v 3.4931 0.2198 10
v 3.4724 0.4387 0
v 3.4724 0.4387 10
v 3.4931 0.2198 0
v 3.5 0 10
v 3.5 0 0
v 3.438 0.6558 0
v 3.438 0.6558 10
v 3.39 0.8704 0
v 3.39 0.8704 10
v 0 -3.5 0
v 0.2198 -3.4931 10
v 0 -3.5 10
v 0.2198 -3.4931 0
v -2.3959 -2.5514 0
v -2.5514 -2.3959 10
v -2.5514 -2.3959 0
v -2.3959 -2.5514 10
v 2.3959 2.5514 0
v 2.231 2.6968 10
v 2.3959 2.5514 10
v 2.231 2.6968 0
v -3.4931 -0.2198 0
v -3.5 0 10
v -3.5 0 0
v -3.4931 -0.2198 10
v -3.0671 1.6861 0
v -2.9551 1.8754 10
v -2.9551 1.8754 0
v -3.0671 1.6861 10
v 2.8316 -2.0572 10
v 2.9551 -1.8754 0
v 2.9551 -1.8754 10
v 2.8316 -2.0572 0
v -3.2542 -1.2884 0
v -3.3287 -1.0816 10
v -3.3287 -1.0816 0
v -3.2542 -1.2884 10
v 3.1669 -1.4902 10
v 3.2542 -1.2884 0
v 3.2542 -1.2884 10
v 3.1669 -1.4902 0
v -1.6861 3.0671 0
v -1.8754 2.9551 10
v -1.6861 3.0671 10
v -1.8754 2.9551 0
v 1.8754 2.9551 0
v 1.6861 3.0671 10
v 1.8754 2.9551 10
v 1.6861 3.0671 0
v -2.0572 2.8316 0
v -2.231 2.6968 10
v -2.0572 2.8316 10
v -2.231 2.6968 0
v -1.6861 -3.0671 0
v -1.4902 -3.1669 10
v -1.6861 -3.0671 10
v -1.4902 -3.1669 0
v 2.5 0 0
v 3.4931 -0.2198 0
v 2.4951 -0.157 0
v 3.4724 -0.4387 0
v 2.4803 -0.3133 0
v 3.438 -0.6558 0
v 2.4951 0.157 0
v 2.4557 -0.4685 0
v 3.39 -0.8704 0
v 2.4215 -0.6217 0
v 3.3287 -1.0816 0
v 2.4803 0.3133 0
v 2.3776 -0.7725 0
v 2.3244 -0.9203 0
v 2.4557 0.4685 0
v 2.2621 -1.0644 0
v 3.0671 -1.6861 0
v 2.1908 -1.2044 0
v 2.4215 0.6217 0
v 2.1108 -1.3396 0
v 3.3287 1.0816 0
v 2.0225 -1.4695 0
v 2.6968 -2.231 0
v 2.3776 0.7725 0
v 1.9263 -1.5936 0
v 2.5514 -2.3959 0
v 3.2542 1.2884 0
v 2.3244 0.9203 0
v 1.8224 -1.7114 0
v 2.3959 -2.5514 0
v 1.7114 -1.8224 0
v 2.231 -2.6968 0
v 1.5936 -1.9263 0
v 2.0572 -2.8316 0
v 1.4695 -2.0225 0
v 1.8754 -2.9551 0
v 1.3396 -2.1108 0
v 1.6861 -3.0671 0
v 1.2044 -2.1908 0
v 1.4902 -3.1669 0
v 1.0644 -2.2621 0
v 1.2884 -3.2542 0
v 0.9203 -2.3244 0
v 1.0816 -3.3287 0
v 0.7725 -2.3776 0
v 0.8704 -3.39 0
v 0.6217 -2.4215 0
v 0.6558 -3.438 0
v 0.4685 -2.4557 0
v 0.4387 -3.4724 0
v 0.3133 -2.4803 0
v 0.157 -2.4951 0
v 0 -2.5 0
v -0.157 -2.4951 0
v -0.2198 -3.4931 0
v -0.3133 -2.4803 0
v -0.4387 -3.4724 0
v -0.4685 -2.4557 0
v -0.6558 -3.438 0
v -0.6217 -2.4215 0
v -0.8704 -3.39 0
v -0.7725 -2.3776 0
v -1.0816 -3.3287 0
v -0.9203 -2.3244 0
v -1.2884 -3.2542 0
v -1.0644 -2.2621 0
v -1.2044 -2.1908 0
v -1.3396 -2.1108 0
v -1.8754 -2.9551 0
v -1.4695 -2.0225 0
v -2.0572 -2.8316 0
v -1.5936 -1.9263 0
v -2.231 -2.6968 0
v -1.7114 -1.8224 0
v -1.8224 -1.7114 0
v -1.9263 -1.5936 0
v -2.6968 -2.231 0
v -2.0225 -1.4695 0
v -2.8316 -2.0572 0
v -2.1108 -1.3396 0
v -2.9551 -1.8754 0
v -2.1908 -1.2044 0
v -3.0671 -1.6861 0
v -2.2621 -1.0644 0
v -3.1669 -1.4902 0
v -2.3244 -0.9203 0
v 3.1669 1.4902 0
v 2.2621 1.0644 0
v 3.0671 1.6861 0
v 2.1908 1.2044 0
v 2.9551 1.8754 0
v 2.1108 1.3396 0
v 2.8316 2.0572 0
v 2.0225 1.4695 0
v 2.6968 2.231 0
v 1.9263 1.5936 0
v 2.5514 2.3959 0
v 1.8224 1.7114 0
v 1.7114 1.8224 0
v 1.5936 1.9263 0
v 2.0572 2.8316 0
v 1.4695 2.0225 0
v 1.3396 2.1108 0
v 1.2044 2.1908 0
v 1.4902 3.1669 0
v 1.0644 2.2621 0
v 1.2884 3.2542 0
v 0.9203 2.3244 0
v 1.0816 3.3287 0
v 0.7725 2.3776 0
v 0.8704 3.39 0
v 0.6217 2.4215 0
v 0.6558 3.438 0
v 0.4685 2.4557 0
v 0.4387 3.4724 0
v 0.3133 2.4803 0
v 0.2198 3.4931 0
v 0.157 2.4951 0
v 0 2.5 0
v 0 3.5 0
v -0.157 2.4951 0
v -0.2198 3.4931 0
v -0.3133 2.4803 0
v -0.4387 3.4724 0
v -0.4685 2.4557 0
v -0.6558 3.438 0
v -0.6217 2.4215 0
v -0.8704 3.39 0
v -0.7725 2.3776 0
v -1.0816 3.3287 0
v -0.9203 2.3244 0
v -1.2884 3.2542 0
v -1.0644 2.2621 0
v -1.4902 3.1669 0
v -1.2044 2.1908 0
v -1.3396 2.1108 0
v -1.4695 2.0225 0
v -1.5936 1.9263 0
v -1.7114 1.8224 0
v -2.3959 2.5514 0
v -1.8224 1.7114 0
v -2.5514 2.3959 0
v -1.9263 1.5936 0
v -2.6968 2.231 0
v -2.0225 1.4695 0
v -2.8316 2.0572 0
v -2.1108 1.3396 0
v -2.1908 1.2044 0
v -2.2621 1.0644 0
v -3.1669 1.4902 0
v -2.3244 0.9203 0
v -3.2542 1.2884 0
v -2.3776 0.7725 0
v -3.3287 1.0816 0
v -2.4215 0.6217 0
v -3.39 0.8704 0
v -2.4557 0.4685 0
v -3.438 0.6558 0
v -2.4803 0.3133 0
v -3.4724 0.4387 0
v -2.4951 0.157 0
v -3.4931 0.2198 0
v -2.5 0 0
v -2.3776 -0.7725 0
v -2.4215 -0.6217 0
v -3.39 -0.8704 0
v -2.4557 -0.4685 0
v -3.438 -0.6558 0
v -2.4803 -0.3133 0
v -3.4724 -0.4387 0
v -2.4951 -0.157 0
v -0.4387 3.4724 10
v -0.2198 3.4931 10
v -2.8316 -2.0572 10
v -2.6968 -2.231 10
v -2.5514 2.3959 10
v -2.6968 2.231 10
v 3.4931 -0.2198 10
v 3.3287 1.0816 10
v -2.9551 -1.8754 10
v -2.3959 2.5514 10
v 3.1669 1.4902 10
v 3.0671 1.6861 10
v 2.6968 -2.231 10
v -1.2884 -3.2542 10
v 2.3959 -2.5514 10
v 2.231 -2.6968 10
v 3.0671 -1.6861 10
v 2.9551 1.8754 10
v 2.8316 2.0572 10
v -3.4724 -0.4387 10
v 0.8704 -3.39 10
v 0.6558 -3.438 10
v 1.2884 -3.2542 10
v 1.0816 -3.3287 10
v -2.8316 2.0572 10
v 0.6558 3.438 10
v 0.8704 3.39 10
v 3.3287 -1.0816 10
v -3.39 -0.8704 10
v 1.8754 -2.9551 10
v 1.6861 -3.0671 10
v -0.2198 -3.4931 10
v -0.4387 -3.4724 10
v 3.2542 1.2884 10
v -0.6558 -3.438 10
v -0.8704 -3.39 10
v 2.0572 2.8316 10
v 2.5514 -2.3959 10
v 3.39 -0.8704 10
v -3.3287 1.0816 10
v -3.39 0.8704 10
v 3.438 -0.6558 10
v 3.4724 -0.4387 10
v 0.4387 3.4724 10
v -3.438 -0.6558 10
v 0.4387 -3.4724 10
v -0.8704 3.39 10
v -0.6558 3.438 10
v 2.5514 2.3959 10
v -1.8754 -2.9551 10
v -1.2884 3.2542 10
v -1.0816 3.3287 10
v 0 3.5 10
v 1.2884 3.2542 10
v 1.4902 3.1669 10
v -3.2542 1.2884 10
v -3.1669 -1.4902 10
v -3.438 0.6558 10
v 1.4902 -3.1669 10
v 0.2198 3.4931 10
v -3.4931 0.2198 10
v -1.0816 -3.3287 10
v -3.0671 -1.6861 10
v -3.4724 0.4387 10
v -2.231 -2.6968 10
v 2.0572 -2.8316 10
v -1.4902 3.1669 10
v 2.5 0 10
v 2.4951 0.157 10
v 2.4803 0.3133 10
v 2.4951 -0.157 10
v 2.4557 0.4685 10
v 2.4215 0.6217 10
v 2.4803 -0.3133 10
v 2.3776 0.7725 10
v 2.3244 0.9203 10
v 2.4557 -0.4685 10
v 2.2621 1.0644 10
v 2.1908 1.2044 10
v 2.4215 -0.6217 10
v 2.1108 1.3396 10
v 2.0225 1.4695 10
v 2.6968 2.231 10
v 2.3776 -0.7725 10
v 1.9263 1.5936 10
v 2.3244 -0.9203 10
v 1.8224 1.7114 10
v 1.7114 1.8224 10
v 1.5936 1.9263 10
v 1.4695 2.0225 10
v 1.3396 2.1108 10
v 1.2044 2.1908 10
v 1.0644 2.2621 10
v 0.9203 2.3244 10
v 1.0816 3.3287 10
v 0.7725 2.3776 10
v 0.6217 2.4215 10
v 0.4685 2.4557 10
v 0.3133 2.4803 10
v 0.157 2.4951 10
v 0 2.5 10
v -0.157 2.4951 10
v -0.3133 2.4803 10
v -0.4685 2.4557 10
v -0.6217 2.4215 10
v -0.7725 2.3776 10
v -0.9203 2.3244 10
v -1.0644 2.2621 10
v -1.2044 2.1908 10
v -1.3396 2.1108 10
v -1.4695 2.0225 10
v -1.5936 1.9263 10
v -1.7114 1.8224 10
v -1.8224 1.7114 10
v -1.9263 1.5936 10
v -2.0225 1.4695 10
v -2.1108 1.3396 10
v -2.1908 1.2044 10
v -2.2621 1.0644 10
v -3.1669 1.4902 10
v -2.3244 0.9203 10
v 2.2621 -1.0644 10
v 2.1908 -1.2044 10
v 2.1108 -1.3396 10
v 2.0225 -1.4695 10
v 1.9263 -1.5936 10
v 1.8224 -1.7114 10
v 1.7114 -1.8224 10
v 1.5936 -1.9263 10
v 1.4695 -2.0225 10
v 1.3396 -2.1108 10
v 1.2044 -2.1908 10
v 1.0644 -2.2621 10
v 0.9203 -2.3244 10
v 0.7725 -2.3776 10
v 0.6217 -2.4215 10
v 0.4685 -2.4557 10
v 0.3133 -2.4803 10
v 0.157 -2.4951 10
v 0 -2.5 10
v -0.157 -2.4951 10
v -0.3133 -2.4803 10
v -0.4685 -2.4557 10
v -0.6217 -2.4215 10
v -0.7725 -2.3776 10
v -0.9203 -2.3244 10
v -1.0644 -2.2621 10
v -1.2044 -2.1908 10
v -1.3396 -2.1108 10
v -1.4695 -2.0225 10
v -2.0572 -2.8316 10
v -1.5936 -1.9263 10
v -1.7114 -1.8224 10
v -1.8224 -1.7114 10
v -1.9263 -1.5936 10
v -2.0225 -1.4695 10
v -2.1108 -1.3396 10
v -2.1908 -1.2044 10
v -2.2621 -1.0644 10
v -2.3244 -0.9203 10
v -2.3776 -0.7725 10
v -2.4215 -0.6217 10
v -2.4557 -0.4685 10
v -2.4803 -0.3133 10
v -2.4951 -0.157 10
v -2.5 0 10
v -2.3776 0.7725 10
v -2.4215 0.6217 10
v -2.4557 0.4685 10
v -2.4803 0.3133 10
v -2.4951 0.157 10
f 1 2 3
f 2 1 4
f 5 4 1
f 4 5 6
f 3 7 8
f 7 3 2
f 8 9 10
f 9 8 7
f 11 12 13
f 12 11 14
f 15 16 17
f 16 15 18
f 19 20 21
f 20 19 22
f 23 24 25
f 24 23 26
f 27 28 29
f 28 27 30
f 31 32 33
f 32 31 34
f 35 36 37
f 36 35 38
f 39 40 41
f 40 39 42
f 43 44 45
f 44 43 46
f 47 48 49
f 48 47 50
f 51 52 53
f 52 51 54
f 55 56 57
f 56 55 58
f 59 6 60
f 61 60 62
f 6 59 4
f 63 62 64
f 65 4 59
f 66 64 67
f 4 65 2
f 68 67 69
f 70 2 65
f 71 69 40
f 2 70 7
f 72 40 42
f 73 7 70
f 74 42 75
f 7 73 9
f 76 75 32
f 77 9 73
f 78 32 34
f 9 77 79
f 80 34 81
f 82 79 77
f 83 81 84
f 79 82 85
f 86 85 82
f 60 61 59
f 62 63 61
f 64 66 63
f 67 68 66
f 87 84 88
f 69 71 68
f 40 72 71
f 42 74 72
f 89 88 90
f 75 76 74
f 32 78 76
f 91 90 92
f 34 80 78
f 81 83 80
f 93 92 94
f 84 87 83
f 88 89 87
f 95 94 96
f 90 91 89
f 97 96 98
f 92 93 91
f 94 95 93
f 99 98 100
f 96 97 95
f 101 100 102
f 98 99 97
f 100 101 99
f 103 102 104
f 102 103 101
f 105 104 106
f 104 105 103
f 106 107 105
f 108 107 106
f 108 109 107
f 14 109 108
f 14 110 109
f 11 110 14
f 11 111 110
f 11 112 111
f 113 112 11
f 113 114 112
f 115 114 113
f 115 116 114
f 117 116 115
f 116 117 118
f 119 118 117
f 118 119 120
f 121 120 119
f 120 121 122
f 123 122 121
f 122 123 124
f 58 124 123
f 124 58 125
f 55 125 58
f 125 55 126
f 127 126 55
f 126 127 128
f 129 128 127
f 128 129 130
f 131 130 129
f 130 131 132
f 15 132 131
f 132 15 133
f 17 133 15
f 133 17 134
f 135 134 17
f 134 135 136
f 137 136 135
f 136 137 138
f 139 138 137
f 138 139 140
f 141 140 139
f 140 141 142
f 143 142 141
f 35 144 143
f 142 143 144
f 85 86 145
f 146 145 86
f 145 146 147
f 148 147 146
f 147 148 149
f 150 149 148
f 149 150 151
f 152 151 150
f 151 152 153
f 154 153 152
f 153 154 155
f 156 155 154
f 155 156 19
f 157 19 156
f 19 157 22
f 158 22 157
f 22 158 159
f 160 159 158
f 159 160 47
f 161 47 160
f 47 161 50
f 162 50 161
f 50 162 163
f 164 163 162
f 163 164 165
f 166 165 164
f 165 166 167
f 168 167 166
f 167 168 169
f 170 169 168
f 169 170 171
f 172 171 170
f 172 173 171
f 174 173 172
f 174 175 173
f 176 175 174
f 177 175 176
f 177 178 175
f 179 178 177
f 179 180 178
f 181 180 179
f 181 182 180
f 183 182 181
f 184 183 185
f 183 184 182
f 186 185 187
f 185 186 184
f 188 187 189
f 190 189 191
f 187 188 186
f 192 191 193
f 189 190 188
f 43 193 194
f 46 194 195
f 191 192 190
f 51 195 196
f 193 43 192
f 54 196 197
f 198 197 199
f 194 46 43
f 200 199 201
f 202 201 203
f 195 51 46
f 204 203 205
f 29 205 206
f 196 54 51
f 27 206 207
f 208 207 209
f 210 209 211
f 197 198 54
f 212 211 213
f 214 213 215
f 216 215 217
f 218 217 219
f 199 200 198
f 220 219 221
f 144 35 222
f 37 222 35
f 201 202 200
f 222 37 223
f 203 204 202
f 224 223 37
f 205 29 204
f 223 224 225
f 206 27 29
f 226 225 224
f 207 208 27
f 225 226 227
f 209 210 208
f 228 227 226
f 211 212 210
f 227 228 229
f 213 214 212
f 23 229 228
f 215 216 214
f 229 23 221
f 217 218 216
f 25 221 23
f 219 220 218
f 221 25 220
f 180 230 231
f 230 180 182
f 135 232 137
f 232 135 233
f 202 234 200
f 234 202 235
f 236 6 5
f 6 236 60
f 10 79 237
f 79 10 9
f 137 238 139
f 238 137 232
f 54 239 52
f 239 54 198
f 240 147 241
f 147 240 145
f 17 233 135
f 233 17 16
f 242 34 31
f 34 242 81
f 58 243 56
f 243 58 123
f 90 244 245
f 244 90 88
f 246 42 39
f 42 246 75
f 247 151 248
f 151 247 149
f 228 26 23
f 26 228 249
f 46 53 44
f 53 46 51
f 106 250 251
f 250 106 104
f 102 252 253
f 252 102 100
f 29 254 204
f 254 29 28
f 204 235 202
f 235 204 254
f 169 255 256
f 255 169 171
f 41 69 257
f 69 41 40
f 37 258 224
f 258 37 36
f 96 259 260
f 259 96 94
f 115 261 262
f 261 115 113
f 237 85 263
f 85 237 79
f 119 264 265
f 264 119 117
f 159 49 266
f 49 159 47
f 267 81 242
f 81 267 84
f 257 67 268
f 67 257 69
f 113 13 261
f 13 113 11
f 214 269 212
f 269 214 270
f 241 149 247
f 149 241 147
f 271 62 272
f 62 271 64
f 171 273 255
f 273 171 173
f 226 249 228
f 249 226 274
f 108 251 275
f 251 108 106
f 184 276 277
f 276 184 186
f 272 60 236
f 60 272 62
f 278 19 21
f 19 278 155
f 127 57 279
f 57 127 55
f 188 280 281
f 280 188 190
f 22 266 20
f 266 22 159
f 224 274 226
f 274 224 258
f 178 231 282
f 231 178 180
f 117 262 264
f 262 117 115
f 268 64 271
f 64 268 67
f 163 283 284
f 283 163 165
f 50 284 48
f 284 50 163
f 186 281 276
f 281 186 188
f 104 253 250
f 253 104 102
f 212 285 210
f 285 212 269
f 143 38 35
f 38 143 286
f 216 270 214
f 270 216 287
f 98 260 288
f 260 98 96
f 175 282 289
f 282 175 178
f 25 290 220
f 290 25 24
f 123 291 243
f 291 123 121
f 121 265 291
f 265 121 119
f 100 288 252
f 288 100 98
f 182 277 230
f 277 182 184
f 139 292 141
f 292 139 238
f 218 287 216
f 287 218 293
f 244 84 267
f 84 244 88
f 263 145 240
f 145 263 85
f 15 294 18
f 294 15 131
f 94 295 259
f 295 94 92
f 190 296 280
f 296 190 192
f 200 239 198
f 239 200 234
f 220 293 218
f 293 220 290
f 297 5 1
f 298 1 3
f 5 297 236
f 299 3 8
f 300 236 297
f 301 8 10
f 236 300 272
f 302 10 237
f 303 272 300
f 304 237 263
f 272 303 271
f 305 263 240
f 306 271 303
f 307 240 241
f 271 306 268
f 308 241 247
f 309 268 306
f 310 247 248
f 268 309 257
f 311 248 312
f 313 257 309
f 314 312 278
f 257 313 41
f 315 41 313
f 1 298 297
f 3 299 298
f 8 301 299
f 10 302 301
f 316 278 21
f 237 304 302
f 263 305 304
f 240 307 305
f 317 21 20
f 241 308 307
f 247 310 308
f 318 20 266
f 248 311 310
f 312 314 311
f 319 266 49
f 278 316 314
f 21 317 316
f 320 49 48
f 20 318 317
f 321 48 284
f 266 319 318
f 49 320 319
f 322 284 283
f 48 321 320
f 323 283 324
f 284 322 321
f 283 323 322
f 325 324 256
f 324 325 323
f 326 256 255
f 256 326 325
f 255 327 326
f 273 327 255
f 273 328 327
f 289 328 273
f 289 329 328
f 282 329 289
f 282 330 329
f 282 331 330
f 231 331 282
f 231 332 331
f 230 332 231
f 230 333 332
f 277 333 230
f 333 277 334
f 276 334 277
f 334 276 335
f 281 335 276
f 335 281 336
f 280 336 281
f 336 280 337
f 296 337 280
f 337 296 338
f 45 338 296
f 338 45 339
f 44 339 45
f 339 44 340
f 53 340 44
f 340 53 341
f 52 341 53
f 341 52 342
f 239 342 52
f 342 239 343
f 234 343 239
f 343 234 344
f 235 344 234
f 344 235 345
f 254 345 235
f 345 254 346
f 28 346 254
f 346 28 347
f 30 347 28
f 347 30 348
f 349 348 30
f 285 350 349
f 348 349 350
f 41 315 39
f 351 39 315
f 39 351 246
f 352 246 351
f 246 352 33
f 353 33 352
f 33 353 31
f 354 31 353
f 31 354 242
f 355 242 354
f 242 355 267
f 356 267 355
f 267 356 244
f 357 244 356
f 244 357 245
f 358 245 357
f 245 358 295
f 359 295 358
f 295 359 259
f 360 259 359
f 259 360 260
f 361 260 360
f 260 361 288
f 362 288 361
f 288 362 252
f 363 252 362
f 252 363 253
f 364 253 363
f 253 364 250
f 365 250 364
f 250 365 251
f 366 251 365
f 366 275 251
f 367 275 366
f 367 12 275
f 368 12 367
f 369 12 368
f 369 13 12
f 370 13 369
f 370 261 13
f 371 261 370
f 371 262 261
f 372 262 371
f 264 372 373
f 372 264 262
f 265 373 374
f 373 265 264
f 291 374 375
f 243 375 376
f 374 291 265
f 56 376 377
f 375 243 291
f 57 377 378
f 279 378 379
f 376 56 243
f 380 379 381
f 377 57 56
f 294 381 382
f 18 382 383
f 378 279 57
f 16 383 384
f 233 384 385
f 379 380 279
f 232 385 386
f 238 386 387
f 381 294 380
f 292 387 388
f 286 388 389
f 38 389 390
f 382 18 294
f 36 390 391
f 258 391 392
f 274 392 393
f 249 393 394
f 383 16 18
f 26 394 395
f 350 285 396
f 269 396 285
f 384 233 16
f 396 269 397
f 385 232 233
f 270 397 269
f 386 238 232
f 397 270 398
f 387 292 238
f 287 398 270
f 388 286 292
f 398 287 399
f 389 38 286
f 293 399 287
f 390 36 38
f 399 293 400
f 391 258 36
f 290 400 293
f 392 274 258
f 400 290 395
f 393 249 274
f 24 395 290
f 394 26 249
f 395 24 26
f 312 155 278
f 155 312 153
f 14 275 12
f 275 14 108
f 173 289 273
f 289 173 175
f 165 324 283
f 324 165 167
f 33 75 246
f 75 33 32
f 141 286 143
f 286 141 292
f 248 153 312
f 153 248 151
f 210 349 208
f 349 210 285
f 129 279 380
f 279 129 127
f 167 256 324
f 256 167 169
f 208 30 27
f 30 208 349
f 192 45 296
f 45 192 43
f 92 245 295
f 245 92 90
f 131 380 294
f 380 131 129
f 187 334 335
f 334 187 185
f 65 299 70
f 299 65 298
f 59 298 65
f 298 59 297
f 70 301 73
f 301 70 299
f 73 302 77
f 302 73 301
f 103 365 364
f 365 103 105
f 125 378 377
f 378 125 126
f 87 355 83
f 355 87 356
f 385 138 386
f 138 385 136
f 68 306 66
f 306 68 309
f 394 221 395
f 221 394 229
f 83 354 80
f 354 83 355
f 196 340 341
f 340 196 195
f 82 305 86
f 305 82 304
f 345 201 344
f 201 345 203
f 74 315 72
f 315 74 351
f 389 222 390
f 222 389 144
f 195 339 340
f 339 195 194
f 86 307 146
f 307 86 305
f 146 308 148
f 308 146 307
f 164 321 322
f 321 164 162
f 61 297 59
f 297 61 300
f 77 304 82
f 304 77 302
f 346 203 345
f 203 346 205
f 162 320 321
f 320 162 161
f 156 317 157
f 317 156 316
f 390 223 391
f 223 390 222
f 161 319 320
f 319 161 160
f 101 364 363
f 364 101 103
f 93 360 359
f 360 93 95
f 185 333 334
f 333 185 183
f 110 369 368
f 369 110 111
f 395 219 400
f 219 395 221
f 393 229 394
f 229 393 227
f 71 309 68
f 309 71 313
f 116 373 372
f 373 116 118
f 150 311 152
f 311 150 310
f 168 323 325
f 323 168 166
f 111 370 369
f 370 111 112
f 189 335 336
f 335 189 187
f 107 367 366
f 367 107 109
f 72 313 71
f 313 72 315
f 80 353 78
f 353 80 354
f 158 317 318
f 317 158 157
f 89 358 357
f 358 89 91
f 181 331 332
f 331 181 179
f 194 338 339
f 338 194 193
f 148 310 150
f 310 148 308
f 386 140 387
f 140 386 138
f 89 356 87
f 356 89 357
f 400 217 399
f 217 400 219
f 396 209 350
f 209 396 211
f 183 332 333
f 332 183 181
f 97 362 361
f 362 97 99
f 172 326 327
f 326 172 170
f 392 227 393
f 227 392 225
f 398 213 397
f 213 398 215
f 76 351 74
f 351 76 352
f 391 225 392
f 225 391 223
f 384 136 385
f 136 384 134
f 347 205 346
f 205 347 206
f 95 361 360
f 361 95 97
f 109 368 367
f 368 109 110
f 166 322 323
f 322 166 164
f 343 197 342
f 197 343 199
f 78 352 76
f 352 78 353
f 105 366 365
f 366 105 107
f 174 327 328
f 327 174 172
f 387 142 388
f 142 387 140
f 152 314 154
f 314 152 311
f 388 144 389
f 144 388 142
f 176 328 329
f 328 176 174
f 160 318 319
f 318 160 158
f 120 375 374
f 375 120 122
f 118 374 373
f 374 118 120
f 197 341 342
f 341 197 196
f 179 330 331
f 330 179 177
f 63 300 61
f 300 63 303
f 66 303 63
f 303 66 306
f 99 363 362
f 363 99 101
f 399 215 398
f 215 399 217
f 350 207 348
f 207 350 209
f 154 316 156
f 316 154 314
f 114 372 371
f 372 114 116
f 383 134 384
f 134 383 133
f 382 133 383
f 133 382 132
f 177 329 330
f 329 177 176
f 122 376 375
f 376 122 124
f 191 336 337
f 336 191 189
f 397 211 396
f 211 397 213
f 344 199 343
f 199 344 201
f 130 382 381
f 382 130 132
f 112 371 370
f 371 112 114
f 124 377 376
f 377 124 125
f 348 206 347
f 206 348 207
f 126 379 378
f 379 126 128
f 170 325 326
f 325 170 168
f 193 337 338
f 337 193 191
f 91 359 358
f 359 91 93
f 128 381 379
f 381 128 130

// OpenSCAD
module tube(id,od,l){
   difference(){
    cylinder(r=od/2,l,$fn=100);
    translate([0,0,-1])cylinder(r=id/2,l+2,$fn=100);
    
   }
    
    
}
tube(5,7,10);
